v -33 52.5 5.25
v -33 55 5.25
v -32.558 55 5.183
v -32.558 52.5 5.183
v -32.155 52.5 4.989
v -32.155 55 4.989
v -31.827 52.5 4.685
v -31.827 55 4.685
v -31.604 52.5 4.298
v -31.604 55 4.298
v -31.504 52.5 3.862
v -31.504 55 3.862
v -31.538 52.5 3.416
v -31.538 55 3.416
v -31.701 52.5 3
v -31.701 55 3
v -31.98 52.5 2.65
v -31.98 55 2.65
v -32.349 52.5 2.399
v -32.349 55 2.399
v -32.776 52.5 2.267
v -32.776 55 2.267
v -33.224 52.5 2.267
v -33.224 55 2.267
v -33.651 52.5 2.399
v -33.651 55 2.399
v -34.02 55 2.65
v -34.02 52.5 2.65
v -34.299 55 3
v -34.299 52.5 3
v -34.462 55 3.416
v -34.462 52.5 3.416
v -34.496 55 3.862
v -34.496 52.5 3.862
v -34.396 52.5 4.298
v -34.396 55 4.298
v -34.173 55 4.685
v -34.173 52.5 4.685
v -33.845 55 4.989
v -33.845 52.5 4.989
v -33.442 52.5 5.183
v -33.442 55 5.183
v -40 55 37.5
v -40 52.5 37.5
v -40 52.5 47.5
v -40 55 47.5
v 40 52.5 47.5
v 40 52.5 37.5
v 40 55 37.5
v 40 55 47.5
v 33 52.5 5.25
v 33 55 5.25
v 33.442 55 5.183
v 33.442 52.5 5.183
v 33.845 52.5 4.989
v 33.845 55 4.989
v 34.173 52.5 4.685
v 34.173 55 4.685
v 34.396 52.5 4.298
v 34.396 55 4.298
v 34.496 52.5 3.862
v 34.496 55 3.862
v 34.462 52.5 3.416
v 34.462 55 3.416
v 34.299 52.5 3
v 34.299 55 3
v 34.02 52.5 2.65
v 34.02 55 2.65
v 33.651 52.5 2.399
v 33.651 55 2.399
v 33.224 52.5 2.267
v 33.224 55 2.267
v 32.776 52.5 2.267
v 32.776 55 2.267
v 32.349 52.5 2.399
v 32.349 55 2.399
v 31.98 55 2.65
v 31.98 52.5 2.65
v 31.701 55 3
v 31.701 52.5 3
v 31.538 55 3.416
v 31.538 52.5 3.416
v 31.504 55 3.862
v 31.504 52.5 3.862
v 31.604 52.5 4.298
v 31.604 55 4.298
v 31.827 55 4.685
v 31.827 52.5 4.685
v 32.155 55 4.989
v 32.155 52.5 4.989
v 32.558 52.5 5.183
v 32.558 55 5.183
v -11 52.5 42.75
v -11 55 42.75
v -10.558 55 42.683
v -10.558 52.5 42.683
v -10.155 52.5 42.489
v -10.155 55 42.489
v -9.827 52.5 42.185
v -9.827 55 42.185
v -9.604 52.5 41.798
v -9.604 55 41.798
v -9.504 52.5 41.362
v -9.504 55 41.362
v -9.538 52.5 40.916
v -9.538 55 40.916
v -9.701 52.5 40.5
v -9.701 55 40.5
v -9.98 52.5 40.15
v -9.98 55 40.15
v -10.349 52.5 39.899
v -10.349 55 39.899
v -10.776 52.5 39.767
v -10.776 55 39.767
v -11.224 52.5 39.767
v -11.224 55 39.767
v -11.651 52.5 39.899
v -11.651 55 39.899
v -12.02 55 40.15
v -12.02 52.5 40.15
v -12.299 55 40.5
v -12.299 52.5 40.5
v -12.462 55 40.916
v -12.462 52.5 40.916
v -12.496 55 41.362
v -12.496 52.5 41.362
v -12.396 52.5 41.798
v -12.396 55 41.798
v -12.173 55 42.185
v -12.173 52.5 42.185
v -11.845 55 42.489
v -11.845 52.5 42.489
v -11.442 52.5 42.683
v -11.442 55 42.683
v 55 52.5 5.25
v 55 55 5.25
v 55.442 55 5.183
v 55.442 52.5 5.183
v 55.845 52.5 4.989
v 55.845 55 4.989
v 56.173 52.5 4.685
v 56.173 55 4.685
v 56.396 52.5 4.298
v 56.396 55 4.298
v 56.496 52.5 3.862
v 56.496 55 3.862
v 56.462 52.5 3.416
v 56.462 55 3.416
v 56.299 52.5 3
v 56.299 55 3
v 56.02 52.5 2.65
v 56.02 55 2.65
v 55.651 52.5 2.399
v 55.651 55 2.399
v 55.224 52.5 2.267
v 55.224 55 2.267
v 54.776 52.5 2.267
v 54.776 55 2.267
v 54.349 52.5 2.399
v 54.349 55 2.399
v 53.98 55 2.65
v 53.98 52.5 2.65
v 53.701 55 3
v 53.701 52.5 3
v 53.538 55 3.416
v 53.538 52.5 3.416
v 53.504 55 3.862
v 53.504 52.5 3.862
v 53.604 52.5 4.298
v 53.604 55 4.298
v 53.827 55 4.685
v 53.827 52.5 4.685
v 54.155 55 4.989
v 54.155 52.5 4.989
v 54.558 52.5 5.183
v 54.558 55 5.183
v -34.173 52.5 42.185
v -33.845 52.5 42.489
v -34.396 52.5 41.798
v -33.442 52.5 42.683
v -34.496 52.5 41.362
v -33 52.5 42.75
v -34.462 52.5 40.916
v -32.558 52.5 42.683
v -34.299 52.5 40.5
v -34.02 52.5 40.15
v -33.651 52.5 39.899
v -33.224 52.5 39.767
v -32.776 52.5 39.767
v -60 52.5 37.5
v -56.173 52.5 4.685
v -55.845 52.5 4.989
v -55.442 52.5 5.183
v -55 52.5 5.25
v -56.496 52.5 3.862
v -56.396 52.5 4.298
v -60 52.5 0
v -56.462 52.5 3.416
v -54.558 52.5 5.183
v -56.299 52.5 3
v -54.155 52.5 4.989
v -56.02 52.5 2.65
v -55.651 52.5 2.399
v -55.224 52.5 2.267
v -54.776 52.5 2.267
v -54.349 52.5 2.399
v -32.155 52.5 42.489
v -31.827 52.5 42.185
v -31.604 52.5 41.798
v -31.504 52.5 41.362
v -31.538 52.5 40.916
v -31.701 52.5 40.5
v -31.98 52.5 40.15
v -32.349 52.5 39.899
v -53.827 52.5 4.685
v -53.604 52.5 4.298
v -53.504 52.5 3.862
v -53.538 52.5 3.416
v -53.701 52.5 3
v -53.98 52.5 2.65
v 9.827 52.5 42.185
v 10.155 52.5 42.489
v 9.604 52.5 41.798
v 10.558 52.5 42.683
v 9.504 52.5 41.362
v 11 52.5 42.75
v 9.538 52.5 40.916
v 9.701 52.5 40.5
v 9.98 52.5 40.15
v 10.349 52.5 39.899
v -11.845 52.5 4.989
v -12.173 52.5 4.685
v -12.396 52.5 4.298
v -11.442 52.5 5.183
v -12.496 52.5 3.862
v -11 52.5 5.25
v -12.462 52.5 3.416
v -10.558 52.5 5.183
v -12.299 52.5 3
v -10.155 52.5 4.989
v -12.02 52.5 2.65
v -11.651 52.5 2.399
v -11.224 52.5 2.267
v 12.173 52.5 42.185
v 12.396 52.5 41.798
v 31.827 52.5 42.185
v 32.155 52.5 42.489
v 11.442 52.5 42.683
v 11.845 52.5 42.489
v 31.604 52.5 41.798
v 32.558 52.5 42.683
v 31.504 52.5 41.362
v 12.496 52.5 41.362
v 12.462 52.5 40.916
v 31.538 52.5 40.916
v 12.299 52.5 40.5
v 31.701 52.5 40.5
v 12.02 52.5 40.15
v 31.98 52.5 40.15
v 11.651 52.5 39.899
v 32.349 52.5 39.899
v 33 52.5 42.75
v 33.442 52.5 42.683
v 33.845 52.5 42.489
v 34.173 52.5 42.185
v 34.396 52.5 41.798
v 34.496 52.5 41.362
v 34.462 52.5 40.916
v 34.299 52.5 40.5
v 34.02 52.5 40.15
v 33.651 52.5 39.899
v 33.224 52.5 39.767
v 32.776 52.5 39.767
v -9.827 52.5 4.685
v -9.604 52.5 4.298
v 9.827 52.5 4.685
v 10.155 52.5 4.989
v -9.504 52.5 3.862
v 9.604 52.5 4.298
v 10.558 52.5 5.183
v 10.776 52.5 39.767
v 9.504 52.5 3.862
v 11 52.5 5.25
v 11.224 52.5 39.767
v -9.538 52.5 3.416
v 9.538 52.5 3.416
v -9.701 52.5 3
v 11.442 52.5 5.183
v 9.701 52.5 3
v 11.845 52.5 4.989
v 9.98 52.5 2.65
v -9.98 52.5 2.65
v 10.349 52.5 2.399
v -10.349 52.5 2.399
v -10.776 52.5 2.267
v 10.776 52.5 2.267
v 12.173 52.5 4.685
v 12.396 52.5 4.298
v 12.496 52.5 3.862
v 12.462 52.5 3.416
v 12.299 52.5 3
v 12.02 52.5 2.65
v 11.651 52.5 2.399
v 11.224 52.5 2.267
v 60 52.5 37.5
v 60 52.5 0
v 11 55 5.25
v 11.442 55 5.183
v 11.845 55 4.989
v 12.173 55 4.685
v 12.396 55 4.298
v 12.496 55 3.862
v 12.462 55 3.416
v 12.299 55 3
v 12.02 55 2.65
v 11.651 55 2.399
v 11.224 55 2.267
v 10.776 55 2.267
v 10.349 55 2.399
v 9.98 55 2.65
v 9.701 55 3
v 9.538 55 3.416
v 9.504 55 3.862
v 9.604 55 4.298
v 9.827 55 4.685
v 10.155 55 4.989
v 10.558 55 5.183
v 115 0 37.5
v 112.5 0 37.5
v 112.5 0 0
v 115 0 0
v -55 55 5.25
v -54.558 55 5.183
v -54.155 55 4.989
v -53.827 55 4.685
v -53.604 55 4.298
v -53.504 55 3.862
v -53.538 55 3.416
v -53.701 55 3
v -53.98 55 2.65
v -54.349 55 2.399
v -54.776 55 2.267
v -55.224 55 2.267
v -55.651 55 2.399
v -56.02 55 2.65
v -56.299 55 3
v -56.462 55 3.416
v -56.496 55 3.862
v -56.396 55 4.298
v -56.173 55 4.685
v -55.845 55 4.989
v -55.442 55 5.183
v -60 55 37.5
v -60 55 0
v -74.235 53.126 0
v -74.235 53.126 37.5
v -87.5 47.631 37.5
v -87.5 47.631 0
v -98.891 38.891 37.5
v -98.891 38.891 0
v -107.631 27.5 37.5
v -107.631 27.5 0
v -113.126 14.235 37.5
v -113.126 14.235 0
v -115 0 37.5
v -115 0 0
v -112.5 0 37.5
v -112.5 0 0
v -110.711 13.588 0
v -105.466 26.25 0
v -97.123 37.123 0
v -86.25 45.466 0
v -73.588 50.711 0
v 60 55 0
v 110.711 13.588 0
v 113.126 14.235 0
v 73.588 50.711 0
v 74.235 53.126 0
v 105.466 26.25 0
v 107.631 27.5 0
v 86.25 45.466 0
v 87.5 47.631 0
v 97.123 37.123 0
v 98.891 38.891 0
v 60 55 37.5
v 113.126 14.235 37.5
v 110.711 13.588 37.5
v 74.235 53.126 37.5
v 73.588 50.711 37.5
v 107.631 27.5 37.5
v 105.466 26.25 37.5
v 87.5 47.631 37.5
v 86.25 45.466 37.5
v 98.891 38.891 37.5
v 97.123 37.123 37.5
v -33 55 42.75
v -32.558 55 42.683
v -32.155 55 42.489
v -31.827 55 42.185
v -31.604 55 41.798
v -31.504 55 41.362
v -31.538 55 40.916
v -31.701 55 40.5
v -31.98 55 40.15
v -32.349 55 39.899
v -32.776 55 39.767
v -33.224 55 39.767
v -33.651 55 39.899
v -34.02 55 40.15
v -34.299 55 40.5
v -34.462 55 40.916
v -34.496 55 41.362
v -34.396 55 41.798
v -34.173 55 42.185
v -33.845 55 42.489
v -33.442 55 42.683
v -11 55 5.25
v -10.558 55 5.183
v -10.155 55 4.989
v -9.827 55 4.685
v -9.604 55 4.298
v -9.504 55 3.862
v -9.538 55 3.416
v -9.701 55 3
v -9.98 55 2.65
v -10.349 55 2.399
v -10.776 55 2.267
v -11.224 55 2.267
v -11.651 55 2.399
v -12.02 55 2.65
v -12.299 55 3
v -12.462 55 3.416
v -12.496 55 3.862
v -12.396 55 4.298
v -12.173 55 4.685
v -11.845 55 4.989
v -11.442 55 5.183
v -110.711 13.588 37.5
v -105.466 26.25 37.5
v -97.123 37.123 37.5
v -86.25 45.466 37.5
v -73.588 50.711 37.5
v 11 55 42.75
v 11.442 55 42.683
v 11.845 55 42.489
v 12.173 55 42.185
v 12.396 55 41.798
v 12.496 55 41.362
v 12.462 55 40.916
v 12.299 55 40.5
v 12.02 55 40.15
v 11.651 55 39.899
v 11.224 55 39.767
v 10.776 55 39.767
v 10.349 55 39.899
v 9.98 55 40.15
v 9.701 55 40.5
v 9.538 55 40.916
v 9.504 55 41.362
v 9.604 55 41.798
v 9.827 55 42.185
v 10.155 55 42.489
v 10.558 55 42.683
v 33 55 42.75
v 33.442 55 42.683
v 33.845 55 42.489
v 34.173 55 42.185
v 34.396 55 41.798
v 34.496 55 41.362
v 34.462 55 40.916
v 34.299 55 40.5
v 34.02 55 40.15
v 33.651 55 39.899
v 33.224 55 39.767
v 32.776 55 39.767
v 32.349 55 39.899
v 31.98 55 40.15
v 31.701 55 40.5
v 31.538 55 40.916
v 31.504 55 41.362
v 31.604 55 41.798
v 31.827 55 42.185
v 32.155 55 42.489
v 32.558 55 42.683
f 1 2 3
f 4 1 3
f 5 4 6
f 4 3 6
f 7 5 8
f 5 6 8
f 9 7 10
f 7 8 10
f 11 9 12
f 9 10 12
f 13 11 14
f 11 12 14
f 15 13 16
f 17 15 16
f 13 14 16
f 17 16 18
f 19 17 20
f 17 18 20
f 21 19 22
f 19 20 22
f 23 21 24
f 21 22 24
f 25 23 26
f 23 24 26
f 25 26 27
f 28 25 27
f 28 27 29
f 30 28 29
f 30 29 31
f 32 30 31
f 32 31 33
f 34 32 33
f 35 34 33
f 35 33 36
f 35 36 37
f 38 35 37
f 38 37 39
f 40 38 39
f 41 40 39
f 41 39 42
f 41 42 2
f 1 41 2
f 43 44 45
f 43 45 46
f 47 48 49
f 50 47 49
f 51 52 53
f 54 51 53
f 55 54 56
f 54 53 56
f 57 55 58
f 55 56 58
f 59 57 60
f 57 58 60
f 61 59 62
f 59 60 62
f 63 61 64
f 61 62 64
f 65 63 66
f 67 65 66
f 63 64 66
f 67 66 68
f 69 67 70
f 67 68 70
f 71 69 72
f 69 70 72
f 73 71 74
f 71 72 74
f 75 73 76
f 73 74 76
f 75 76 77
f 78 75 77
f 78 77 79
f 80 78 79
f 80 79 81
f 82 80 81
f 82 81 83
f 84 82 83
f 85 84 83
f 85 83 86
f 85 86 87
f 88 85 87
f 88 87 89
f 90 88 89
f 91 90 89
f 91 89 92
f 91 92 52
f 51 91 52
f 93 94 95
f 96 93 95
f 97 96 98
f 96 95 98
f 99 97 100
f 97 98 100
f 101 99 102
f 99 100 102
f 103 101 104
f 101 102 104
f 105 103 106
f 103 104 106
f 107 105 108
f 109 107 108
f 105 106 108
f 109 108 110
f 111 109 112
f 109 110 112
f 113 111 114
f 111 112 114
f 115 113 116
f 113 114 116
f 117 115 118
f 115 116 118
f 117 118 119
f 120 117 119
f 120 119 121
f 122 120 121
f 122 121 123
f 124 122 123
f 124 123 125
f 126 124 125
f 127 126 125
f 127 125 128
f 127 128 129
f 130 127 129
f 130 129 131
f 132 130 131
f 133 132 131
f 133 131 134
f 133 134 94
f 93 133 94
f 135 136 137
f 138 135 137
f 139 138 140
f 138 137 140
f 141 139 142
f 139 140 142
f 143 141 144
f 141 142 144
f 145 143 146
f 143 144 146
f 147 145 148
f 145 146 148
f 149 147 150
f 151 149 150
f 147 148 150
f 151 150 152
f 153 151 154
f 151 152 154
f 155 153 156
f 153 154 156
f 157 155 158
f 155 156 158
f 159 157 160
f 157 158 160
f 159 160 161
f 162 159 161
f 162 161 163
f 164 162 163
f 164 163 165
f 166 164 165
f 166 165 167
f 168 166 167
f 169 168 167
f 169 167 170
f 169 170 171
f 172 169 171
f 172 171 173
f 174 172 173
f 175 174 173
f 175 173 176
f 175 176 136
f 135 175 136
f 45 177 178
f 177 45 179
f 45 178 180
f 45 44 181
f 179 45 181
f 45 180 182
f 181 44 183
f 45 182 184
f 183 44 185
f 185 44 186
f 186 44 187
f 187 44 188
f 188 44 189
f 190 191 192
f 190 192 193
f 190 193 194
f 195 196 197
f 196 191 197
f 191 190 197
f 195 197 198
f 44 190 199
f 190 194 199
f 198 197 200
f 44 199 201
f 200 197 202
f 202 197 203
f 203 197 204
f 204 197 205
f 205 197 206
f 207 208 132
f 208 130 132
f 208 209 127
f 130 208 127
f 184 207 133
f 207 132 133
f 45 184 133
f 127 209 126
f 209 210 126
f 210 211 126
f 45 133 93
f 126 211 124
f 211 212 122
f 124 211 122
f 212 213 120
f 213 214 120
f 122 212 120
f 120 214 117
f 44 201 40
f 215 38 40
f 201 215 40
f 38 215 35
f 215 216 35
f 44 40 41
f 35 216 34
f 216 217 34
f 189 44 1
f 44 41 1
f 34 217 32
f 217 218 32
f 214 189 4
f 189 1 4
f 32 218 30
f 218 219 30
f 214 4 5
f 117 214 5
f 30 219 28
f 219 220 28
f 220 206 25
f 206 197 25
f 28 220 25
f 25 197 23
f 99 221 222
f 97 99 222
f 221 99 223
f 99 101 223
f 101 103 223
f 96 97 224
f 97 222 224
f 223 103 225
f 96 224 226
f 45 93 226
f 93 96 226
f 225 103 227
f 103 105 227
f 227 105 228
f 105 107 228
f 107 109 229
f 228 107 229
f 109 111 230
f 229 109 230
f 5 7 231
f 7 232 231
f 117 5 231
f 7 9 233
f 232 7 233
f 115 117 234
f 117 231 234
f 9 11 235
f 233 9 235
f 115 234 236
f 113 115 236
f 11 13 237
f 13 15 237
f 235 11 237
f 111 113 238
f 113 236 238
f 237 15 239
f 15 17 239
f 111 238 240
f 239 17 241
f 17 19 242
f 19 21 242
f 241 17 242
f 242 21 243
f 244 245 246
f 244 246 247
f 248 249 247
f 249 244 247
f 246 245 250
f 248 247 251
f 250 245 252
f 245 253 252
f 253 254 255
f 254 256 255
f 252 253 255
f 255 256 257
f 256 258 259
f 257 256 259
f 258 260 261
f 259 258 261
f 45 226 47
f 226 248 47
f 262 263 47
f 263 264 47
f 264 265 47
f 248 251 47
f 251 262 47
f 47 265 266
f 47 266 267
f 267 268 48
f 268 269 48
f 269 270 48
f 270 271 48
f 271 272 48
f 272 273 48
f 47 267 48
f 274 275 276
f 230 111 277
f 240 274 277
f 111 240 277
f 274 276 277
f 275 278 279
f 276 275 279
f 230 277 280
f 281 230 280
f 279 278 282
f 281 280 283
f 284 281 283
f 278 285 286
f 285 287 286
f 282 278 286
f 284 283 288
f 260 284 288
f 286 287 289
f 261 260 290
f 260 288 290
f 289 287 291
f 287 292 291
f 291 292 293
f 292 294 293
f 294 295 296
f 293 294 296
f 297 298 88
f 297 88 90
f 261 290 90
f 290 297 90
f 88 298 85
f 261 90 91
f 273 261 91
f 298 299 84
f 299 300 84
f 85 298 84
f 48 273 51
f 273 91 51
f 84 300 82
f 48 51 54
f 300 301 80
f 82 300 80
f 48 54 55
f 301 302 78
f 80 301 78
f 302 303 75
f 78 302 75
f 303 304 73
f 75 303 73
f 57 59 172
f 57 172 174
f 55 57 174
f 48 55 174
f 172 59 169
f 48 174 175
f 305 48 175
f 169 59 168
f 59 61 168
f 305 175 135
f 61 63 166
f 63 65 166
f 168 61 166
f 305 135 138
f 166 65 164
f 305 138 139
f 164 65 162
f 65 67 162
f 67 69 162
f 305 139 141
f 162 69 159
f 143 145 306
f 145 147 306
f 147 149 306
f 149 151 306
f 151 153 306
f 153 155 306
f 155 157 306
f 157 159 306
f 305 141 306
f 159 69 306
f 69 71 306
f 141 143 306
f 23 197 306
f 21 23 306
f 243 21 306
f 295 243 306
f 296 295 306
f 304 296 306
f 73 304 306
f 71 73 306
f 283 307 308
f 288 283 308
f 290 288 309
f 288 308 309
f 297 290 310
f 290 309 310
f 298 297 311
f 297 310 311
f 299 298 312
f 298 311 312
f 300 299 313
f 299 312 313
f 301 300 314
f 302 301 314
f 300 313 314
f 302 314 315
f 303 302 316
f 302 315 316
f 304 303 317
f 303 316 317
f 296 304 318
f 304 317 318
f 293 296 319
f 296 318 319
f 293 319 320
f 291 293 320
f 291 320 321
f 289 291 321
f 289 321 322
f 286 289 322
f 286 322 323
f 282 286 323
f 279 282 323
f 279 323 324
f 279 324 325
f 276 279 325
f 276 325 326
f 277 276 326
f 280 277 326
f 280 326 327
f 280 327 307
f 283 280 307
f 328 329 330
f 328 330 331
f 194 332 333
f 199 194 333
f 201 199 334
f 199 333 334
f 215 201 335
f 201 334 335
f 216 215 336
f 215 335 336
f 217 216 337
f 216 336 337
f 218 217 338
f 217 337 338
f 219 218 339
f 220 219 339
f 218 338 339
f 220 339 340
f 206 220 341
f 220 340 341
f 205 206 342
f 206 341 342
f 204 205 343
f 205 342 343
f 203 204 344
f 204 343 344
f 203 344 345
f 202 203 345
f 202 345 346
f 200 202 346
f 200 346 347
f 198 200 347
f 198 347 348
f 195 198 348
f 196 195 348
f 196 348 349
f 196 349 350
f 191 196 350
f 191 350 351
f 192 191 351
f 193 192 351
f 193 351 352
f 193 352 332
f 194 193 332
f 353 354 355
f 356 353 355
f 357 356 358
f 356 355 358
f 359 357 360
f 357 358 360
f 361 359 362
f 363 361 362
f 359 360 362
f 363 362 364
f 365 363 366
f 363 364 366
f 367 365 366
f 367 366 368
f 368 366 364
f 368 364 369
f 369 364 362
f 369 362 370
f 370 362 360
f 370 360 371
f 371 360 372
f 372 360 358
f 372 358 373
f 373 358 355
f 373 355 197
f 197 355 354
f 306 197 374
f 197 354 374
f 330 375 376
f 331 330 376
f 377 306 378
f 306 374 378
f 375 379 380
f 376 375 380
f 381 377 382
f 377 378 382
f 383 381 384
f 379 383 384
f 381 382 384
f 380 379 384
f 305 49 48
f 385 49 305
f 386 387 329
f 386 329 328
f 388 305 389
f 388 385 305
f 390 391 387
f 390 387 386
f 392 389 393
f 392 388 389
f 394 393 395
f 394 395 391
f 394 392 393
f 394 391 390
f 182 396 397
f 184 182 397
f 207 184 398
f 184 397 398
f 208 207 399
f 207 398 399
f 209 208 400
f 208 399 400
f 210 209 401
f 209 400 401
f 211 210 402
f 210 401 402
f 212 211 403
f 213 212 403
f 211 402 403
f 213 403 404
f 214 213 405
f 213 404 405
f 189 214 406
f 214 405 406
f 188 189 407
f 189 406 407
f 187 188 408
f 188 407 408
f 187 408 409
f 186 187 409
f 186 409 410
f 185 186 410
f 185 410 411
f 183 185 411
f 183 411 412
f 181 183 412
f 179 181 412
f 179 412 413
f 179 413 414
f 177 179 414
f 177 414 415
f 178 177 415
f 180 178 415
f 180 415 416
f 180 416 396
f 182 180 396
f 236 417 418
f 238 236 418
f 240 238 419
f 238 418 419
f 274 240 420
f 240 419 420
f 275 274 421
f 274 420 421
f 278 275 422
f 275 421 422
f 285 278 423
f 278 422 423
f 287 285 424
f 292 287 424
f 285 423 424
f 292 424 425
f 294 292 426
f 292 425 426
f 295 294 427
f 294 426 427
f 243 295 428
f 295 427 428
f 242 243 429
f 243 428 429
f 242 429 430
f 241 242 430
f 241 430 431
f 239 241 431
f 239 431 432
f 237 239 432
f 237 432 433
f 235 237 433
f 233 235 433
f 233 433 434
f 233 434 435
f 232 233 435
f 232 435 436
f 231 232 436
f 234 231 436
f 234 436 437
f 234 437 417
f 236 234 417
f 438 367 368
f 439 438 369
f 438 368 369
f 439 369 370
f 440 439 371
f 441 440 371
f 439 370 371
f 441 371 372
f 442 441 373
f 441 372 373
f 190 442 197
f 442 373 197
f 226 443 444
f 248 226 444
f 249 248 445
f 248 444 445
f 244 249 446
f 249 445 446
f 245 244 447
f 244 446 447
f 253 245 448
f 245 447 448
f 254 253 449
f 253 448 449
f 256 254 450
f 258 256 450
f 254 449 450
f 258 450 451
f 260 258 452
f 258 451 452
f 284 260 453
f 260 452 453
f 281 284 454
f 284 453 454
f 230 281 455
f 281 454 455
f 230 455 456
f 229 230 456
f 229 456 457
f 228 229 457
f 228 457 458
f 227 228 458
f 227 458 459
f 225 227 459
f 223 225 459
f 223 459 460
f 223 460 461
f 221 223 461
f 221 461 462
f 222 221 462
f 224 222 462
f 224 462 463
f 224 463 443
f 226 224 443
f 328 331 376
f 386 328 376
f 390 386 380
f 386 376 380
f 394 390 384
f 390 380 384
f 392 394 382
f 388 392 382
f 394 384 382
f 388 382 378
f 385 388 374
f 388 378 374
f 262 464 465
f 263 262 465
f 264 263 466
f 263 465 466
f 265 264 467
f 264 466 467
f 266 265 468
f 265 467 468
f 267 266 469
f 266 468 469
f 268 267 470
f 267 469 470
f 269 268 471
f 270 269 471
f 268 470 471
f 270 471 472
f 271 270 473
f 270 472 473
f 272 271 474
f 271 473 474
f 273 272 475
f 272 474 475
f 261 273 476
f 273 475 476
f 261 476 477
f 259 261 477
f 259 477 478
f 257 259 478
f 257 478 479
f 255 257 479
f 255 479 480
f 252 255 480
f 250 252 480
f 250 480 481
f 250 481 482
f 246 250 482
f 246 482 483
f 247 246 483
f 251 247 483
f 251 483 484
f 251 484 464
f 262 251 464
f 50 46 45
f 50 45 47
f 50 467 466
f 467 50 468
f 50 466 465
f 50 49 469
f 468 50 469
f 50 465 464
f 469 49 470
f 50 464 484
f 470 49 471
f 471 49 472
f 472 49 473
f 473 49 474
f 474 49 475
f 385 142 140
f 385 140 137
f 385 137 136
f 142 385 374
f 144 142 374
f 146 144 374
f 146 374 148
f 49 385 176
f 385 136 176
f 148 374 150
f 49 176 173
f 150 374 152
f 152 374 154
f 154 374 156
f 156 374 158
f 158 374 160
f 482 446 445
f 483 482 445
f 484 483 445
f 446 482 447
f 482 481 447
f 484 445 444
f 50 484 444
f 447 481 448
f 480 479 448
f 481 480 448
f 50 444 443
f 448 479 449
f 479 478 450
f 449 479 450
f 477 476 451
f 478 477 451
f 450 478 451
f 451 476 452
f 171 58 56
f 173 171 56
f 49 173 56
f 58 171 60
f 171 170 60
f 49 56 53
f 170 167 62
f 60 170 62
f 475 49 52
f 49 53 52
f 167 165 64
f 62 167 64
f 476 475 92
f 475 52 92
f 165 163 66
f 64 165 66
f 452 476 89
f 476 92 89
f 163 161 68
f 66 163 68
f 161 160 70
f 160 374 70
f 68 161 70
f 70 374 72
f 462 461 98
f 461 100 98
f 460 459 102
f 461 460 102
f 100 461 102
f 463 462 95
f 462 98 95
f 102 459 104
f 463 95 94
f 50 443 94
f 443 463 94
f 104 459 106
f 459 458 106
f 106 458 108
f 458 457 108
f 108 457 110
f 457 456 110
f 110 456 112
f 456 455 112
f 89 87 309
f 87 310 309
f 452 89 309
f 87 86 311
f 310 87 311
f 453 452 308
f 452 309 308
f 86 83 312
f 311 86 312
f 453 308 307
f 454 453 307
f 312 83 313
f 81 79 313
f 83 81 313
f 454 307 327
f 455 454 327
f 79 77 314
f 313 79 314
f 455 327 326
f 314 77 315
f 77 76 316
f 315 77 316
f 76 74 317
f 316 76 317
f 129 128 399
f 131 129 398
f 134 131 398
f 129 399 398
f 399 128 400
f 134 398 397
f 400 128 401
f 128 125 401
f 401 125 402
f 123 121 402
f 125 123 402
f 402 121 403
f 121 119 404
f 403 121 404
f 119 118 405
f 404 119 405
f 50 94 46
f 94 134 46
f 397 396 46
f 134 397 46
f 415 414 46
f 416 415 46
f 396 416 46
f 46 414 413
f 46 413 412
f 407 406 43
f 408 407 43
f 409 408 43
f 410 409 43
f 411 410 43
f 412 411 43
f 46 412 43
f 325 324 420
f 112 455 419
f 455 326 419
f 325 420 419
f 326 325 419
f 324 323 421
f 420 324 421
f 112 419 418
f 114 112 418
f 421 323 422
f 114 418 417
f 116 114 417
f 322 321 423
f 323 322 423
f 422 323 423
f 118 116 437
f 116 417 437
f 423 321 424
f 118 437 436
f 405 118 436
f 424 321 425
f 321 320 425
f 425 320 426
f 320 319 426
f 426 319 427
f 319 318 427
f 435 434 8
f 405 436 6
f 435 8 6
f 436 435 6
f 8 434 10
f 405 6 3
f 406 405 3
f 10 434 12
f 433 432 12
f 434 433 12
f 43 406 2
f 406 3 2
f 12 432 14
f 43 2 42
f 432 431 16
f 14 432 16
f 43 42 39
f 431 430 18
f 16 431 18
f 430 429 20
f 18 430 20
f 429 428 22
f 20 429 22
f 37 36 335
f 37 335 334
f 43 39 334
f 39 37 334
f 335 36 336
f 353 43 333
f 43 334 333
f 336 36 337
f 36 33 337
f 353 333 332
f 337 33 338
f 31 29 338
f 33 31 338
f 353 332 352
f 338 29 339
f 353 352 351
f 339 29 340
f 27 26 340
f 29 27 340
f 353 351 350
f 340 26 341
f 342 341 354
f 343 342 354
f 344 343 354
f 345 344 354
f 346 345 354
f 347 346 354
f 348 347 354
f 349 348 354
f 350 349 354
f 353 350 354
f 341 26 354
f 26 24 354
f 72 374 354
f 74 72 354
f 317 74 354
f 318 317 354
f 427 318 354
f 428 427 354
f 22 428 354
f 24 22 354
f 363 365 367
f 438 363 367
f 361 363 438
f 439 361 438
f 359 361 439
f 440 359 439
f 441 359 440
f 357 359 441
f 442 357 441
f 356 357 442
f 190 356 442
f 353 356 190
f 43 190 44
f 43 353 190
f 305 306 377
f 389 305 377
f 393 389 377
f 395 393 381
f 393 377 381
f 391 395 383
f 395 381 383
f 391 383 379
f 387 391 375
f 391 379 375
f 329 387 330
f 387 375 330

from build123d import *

# Parameters (mm, degrees)
BOSS_EXTRUDE2_DEPTH = 37.5
SKETCH2_W           = 80
SKETCH2_H           = 2.5
BOSS_EXTRUDE3_DEPTH = 10
SKETCH3_R           = 1.5
CUT_EXTRUDE1_DEPTH  = 10
SKETCH4_R           = 1.5
CUT_EXTRUDE2_DEPTH  = 10


with BuildPart() as part:
    # Sketch1 → Boss-Extrude2 (new body)
    with BuildSketch(Plane.XY):
        with BuildLine():
            ThreePointArc((-112.5, 0), (-97.123106012, 37.123106012), (-60, 52.5))
            Line((-60, 52.5), (60, 52.5))
            ThreePointArc((60, 52.5), (97.123106012, 37.123106012), (112.5, 0))
            Line((112.5, 0), (115, 0))
            ThreePointArc((115, 0), (98.890872965, 38.890872965), (60, 55))
            Line((60, 55), (-60, 55))
            ThreePointArc((-60, 55), (-98.890872965, 38.890872965), (-115, 0))
            Line((-115, 0), (-112.5, 0))
        make_face()
    extrude(amount=BOSS_EXTRUDE2_DEPTH)

    # Sketch2 → Boss-Extrude3 (add)
    with BuildSketch(Plane.XY.offset(37.5)):
        with Locations((0, 53.75)):
            Rectangle(SKETCH2_W, SKETCH2_H)
    extrude(amount=BOSS_EXTRUDE3_DEPTH)

    # Sketch3 → Cut-Extrude1 (cut)
    with BuildSketch(Plane(origin=(0, 55, 0), x_dir=(1, 0, 0), z_dir=(0, 1, 0))):
        with Locations(Location((-33, -41.25, 0), (0, 0, 270))):
            Circle(SKETCH3_R)
        with Locations(Location((-11, -41.25, 0), (0, 0, 270))):
            Circle(SKETCH3_R)
        with Locations(Location((11, -41.25, 0), (0, 0, 270))):
            Circle(SKETCH3_R)
        with Locations(Location((33, -41.25, 0), (0, 0, 270))):
            Circle(SKETCH3_R)
    extrude(amount=-CUT_EXTRUDE1_DEPTH, mode=Mode.SUBTRACT)

    # Sketch4 → Cut-Extrude2 (cut)
    with BuildSketch(Plane(origin=(0, 55, 0), x_dir=(1, 0, 0), z_dir=(0, 1, 0))):
        with Locations(Location((-55, -3.75, 0), (0, 0, 270))):
            Circle(SKETCH4_R)
        with Locations(Location((-33, -3.75, 0), (0, 0, 270))):
            Circle(SKETCH4_R)
        with Locations(Location((-11, -3.75, 0), (0, 0, 270))):
            Circle(SKETCH4_R)
        with Locations(Location((11, -3.75, 0), (0, 0, 270))):
            Circle(SKETCH4_R)
        with Locations(Location((33, -3.75, 0), (0, 0, 270))):
            Circle(SKETCH4_R)
        with Locations(Location((55, -3.75, 0), (0, 0, 270))):
            Circle(SKETCH4_R)
    extrude(amount=-CUT_EXTRUDE2_DEPTH, mode=Mode.SUBTRACT)


solid = part.part
